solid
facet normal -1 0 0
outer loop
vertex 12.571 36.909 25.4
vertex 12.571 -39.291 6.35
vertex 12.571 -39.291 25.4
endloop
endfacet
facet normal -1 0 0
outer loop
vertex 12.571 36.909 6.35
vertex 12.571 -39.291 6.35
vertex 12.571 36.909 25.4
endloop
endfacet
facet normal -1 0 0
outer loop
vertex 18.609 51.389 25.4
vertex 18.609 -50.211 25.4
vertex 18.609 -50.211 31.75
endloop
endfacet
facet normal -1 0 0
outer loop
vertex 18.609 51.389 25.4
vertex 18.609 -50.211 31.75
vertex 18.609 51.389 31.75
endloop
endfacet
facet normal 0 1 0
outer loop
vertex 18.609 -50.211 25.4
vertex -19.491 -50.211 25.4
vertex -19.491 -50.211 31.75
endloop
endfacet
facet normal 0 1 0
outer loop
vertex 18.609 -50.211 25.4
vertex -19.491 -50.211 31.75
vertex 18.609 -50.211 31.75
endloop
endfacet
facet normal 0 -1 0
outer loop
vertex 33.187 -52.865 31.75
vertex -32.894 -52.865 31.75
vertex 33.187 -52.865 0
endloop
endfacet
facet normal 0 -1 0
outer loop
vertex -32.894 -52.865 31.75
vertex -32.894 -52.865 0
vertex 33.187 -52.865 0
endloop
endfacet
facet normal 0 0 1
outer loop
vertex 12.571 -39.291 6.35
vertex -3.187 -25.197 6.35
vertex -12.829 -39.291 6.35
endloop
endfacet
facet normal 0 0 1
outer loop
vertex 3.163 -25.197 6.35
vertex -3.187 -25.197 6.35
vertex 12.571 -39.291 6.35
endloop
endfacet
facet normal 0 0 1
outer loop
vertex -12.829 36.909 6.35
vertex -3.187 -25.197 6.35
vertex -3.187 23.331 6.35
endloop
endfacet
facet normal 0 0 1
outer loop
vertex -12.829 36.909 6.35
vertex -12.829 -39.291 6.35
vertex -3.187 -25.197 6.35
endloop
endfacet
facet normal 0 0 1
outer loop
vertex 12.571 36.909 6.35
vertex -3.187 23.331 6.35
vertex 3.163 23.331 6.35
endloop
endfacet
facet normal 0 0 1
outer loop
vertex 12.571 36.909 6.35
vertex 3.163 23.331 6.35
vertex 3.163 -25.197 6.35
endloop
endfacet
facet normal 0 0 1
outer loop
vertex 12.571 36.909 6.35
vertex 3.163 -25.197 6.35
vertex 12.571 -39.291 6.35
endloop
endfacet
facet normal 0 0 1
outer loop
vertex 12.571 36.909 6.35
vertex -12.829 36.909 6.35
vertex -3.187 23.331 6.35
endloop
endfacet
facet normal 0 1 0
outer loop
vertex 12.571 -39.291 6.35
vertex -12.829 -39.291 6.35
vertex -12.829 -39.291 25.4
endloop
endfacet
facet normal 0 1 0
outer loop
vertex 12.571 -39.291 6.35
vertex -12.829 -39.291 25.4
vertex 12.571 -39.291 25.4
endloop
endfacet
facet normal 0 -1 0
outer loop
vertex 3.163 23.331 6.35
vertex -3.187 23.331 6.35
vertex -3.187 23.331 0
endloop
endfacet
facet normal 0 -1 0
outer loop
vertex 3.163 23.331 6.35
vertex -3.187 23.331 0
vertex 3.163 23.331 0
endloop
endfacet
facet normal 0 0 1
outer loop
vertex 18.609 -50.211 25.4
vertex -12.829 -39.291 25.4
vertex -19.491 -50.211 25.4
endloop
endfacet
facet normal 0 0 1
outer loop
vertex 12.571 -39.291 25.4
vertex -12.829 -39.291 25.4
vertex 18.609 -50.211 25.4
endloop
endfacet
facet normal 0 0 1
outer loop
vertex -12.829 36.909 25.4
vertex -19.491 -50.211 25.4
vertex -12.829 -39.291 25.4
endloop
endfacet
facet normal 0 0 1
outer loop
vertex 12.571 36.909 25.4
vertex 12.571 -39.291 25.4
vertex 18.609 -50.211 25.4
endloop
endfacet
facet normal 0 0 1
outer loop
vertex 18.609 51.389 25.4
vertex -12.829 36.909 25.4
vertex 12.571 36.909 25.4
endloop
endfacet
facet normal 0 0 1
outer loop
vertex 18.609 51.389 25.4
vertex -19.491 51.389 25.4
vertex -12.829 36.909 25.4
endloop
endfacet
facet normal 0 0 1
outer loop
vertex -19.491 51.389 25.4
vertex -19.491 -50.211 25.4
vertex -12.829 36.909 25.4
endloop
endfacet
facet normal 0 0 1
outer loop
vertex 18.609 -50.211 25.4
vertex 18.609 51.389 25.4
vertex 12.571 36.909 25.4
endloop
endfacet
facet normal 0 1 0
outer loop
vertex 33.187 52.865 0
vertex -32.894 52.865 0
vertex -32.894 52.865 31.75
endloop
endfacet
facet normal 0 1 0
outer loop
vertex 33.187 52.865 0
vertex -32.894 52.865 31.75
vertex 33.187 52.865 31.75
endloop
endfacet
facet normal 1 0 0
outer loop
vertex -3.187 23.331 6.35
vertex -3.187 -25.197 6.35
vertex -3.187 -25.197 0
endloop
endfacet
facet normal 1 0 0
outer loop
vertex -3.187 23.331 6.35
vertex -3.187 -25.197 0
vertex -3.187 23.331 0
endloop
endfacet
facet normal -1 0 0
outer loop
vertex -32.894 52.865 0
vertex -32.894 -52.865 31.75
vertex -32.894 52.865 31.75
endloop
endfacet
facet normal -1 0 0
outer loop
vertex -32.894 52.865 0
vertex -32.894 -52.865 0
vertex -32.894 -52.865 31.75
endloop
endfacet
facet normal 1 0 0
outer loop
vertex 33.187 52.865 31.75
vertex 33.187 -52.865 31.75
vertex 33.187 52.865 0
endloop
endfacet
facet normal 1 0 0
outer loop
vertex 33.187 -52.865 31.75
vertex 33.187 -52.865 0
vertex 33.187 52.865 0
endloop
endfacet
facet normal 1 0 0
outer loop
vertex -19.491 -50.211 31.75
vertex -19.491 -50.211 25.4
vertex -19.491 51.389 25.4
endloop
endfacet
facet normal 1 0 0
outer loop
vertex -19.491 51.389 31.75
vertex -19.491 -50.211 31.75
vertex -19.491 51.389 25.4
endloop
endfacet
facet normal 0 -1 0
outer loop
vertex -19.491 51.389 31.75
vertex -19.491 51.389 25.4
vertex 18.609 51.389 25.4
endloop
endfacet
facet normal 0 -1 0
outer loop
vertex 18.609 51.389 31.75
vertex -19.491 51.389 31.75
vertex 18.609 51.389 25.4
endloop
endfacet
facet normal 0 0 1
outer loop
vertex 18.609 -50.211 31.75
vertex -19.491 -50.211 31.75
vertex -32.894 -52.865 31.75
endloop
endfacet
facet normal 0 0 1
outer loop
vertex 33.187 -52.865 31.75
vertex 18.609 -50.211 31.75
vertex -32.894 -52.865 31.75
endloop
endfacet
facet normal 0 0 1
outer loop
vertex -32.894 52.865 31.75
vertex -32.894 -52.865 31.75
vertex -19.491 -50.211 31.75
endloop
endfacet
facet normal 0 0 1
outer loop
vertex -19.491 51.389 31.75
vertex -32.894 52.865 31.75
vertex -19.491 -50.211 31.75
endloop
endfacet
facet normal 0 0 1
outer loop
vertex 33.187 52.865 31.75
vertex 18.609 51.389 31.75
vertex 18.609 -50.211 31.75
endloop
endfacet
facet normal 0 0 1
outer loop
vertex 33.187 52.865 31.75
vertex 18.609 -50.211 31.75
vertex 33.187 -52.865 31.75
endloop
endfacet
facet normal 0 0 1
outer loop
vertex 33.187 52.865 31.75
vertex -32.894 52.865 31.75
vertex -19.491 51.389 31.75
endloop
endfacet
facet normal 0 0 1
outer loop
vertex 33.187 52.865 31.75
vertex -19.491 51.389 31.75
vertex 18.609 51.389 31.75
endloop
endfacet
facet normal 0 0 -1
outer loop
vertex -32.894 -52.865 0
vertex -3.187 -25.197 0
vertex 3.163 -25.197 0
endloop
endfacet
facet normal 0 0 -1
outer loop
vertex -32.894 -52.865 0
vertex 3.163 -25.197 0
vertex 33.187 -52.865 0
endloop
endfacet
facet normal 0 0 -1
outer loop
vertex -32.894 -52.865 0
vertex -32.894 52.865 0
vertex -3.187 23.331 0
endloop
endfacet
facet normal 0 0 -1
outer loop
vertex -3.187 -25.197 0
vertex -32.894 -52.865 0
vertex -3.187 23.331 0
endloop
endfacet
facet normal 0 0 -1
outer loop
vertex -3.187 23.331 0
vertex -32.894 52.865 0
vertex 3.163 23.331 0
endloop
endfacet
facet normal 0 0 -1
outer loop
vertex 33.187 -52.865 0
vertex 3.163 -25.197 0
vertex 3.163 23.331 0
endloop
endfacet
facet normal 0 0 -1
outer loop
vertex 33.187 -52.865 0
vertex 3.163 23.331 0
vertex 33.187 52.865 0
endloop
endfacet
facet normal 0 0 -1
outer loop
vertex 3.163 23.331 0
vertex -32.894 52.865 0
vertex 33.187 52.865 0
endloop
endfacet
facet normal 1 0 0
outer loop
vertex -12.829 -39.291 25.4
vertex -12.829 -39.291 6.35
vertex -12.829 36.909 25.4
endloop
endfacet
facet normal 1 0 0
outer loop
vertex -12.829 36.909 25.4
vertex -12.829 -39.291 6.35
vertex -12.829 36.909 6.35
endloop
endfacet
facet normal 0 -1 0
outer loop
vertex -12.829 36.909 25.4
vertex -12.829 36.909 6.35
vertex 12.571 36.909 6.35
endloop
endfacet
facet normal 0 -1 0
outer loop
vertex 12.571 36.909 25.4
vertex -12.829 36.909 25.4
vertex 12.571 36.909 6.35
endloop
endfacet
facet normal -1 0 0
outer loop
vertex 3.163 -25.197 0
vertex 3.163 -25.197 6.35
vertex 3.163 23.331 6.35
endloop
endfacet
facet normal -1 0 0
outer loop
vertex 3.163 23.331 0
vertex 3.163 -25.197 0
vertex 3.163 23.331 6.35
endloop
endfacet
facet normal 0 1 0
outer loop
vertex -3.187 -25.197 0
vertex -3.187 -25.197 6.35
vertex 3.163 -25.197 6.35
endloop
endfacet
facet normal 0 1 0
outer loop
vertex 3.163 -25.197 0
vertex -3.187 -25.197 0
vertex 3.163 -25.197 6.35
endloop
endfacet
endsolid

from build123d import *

# Parameters (mm, degrees)
F0_W          = 66.080972
F0_H          = 105.729562
F1_DEPTH      = 6.35
F2_W          = 66.080972
F2_H          = 105.729562
F2_W_2        = 38.1
F2_H_2        = 101.6
F3_DEPTH      = 25.4
F4_W          = 38.1
F4_H          = 101.6
F4_W_2        = 25.4
F4_H_2        = 76.2
F5_DEPTH      = 19.05
F6_W          = 6.35
F6_H          = 48.527334
F7_DEPTH      = 25.4
F7_DEPTH_BACK = 25.4


with BuildPart() as f1:
    # F0 (on Top) → F1 (new body)
    with BuildSketch(Plane.XY):
        with Locations((0.146851, 2e-06)):
            Rectangle(F0_W, F0_H)
    extrude(amount=F1_DEPTH)

    # F2 (on face) → F3 (join)
    with BuildSketch(Plane.XY.offset(6.35)):
        with Locations((0.146851, 2e-06)):
            Rectangle(F2_W, F2_H)
        with Locations((-0.440535, 0.589116)):
            Rectangle(F2_W_2, F2_H_2, mode=Mode.SUBTRACT)
    extrude(amount=F3_DEPTH)

    # F4 (on face) → F5 (join)
    with BuildSketch(Plane.XY.offset(6.35)):
        with Locations((-0.440535, 0.589116)):
            Rectangle(F4_W, F4_H)
        with Locations((-0.128517, -1.191032)):
            Rectangle(F4_W_2, F4_H_2, mode=Mode.SUBTRACT)
    extrude(amount=F5_DEPTH)

    # F6 (on face) → F7 (cut, two sides)
    with BuildSketch(Plane.XY.offset(6.35)) as f7_sk:
        with Locations((-0.011918, -0.932903)):
            Rectangle(F6_W, F6_H)
    extrude(amount=F7_DEPTH, mode=Mode.SUBTRACT)
    extrude(f7_sk.sketch, amount=-F7_DEPTH_BACK, mode=Mode.SUBTRACT)


solid = f1.part
